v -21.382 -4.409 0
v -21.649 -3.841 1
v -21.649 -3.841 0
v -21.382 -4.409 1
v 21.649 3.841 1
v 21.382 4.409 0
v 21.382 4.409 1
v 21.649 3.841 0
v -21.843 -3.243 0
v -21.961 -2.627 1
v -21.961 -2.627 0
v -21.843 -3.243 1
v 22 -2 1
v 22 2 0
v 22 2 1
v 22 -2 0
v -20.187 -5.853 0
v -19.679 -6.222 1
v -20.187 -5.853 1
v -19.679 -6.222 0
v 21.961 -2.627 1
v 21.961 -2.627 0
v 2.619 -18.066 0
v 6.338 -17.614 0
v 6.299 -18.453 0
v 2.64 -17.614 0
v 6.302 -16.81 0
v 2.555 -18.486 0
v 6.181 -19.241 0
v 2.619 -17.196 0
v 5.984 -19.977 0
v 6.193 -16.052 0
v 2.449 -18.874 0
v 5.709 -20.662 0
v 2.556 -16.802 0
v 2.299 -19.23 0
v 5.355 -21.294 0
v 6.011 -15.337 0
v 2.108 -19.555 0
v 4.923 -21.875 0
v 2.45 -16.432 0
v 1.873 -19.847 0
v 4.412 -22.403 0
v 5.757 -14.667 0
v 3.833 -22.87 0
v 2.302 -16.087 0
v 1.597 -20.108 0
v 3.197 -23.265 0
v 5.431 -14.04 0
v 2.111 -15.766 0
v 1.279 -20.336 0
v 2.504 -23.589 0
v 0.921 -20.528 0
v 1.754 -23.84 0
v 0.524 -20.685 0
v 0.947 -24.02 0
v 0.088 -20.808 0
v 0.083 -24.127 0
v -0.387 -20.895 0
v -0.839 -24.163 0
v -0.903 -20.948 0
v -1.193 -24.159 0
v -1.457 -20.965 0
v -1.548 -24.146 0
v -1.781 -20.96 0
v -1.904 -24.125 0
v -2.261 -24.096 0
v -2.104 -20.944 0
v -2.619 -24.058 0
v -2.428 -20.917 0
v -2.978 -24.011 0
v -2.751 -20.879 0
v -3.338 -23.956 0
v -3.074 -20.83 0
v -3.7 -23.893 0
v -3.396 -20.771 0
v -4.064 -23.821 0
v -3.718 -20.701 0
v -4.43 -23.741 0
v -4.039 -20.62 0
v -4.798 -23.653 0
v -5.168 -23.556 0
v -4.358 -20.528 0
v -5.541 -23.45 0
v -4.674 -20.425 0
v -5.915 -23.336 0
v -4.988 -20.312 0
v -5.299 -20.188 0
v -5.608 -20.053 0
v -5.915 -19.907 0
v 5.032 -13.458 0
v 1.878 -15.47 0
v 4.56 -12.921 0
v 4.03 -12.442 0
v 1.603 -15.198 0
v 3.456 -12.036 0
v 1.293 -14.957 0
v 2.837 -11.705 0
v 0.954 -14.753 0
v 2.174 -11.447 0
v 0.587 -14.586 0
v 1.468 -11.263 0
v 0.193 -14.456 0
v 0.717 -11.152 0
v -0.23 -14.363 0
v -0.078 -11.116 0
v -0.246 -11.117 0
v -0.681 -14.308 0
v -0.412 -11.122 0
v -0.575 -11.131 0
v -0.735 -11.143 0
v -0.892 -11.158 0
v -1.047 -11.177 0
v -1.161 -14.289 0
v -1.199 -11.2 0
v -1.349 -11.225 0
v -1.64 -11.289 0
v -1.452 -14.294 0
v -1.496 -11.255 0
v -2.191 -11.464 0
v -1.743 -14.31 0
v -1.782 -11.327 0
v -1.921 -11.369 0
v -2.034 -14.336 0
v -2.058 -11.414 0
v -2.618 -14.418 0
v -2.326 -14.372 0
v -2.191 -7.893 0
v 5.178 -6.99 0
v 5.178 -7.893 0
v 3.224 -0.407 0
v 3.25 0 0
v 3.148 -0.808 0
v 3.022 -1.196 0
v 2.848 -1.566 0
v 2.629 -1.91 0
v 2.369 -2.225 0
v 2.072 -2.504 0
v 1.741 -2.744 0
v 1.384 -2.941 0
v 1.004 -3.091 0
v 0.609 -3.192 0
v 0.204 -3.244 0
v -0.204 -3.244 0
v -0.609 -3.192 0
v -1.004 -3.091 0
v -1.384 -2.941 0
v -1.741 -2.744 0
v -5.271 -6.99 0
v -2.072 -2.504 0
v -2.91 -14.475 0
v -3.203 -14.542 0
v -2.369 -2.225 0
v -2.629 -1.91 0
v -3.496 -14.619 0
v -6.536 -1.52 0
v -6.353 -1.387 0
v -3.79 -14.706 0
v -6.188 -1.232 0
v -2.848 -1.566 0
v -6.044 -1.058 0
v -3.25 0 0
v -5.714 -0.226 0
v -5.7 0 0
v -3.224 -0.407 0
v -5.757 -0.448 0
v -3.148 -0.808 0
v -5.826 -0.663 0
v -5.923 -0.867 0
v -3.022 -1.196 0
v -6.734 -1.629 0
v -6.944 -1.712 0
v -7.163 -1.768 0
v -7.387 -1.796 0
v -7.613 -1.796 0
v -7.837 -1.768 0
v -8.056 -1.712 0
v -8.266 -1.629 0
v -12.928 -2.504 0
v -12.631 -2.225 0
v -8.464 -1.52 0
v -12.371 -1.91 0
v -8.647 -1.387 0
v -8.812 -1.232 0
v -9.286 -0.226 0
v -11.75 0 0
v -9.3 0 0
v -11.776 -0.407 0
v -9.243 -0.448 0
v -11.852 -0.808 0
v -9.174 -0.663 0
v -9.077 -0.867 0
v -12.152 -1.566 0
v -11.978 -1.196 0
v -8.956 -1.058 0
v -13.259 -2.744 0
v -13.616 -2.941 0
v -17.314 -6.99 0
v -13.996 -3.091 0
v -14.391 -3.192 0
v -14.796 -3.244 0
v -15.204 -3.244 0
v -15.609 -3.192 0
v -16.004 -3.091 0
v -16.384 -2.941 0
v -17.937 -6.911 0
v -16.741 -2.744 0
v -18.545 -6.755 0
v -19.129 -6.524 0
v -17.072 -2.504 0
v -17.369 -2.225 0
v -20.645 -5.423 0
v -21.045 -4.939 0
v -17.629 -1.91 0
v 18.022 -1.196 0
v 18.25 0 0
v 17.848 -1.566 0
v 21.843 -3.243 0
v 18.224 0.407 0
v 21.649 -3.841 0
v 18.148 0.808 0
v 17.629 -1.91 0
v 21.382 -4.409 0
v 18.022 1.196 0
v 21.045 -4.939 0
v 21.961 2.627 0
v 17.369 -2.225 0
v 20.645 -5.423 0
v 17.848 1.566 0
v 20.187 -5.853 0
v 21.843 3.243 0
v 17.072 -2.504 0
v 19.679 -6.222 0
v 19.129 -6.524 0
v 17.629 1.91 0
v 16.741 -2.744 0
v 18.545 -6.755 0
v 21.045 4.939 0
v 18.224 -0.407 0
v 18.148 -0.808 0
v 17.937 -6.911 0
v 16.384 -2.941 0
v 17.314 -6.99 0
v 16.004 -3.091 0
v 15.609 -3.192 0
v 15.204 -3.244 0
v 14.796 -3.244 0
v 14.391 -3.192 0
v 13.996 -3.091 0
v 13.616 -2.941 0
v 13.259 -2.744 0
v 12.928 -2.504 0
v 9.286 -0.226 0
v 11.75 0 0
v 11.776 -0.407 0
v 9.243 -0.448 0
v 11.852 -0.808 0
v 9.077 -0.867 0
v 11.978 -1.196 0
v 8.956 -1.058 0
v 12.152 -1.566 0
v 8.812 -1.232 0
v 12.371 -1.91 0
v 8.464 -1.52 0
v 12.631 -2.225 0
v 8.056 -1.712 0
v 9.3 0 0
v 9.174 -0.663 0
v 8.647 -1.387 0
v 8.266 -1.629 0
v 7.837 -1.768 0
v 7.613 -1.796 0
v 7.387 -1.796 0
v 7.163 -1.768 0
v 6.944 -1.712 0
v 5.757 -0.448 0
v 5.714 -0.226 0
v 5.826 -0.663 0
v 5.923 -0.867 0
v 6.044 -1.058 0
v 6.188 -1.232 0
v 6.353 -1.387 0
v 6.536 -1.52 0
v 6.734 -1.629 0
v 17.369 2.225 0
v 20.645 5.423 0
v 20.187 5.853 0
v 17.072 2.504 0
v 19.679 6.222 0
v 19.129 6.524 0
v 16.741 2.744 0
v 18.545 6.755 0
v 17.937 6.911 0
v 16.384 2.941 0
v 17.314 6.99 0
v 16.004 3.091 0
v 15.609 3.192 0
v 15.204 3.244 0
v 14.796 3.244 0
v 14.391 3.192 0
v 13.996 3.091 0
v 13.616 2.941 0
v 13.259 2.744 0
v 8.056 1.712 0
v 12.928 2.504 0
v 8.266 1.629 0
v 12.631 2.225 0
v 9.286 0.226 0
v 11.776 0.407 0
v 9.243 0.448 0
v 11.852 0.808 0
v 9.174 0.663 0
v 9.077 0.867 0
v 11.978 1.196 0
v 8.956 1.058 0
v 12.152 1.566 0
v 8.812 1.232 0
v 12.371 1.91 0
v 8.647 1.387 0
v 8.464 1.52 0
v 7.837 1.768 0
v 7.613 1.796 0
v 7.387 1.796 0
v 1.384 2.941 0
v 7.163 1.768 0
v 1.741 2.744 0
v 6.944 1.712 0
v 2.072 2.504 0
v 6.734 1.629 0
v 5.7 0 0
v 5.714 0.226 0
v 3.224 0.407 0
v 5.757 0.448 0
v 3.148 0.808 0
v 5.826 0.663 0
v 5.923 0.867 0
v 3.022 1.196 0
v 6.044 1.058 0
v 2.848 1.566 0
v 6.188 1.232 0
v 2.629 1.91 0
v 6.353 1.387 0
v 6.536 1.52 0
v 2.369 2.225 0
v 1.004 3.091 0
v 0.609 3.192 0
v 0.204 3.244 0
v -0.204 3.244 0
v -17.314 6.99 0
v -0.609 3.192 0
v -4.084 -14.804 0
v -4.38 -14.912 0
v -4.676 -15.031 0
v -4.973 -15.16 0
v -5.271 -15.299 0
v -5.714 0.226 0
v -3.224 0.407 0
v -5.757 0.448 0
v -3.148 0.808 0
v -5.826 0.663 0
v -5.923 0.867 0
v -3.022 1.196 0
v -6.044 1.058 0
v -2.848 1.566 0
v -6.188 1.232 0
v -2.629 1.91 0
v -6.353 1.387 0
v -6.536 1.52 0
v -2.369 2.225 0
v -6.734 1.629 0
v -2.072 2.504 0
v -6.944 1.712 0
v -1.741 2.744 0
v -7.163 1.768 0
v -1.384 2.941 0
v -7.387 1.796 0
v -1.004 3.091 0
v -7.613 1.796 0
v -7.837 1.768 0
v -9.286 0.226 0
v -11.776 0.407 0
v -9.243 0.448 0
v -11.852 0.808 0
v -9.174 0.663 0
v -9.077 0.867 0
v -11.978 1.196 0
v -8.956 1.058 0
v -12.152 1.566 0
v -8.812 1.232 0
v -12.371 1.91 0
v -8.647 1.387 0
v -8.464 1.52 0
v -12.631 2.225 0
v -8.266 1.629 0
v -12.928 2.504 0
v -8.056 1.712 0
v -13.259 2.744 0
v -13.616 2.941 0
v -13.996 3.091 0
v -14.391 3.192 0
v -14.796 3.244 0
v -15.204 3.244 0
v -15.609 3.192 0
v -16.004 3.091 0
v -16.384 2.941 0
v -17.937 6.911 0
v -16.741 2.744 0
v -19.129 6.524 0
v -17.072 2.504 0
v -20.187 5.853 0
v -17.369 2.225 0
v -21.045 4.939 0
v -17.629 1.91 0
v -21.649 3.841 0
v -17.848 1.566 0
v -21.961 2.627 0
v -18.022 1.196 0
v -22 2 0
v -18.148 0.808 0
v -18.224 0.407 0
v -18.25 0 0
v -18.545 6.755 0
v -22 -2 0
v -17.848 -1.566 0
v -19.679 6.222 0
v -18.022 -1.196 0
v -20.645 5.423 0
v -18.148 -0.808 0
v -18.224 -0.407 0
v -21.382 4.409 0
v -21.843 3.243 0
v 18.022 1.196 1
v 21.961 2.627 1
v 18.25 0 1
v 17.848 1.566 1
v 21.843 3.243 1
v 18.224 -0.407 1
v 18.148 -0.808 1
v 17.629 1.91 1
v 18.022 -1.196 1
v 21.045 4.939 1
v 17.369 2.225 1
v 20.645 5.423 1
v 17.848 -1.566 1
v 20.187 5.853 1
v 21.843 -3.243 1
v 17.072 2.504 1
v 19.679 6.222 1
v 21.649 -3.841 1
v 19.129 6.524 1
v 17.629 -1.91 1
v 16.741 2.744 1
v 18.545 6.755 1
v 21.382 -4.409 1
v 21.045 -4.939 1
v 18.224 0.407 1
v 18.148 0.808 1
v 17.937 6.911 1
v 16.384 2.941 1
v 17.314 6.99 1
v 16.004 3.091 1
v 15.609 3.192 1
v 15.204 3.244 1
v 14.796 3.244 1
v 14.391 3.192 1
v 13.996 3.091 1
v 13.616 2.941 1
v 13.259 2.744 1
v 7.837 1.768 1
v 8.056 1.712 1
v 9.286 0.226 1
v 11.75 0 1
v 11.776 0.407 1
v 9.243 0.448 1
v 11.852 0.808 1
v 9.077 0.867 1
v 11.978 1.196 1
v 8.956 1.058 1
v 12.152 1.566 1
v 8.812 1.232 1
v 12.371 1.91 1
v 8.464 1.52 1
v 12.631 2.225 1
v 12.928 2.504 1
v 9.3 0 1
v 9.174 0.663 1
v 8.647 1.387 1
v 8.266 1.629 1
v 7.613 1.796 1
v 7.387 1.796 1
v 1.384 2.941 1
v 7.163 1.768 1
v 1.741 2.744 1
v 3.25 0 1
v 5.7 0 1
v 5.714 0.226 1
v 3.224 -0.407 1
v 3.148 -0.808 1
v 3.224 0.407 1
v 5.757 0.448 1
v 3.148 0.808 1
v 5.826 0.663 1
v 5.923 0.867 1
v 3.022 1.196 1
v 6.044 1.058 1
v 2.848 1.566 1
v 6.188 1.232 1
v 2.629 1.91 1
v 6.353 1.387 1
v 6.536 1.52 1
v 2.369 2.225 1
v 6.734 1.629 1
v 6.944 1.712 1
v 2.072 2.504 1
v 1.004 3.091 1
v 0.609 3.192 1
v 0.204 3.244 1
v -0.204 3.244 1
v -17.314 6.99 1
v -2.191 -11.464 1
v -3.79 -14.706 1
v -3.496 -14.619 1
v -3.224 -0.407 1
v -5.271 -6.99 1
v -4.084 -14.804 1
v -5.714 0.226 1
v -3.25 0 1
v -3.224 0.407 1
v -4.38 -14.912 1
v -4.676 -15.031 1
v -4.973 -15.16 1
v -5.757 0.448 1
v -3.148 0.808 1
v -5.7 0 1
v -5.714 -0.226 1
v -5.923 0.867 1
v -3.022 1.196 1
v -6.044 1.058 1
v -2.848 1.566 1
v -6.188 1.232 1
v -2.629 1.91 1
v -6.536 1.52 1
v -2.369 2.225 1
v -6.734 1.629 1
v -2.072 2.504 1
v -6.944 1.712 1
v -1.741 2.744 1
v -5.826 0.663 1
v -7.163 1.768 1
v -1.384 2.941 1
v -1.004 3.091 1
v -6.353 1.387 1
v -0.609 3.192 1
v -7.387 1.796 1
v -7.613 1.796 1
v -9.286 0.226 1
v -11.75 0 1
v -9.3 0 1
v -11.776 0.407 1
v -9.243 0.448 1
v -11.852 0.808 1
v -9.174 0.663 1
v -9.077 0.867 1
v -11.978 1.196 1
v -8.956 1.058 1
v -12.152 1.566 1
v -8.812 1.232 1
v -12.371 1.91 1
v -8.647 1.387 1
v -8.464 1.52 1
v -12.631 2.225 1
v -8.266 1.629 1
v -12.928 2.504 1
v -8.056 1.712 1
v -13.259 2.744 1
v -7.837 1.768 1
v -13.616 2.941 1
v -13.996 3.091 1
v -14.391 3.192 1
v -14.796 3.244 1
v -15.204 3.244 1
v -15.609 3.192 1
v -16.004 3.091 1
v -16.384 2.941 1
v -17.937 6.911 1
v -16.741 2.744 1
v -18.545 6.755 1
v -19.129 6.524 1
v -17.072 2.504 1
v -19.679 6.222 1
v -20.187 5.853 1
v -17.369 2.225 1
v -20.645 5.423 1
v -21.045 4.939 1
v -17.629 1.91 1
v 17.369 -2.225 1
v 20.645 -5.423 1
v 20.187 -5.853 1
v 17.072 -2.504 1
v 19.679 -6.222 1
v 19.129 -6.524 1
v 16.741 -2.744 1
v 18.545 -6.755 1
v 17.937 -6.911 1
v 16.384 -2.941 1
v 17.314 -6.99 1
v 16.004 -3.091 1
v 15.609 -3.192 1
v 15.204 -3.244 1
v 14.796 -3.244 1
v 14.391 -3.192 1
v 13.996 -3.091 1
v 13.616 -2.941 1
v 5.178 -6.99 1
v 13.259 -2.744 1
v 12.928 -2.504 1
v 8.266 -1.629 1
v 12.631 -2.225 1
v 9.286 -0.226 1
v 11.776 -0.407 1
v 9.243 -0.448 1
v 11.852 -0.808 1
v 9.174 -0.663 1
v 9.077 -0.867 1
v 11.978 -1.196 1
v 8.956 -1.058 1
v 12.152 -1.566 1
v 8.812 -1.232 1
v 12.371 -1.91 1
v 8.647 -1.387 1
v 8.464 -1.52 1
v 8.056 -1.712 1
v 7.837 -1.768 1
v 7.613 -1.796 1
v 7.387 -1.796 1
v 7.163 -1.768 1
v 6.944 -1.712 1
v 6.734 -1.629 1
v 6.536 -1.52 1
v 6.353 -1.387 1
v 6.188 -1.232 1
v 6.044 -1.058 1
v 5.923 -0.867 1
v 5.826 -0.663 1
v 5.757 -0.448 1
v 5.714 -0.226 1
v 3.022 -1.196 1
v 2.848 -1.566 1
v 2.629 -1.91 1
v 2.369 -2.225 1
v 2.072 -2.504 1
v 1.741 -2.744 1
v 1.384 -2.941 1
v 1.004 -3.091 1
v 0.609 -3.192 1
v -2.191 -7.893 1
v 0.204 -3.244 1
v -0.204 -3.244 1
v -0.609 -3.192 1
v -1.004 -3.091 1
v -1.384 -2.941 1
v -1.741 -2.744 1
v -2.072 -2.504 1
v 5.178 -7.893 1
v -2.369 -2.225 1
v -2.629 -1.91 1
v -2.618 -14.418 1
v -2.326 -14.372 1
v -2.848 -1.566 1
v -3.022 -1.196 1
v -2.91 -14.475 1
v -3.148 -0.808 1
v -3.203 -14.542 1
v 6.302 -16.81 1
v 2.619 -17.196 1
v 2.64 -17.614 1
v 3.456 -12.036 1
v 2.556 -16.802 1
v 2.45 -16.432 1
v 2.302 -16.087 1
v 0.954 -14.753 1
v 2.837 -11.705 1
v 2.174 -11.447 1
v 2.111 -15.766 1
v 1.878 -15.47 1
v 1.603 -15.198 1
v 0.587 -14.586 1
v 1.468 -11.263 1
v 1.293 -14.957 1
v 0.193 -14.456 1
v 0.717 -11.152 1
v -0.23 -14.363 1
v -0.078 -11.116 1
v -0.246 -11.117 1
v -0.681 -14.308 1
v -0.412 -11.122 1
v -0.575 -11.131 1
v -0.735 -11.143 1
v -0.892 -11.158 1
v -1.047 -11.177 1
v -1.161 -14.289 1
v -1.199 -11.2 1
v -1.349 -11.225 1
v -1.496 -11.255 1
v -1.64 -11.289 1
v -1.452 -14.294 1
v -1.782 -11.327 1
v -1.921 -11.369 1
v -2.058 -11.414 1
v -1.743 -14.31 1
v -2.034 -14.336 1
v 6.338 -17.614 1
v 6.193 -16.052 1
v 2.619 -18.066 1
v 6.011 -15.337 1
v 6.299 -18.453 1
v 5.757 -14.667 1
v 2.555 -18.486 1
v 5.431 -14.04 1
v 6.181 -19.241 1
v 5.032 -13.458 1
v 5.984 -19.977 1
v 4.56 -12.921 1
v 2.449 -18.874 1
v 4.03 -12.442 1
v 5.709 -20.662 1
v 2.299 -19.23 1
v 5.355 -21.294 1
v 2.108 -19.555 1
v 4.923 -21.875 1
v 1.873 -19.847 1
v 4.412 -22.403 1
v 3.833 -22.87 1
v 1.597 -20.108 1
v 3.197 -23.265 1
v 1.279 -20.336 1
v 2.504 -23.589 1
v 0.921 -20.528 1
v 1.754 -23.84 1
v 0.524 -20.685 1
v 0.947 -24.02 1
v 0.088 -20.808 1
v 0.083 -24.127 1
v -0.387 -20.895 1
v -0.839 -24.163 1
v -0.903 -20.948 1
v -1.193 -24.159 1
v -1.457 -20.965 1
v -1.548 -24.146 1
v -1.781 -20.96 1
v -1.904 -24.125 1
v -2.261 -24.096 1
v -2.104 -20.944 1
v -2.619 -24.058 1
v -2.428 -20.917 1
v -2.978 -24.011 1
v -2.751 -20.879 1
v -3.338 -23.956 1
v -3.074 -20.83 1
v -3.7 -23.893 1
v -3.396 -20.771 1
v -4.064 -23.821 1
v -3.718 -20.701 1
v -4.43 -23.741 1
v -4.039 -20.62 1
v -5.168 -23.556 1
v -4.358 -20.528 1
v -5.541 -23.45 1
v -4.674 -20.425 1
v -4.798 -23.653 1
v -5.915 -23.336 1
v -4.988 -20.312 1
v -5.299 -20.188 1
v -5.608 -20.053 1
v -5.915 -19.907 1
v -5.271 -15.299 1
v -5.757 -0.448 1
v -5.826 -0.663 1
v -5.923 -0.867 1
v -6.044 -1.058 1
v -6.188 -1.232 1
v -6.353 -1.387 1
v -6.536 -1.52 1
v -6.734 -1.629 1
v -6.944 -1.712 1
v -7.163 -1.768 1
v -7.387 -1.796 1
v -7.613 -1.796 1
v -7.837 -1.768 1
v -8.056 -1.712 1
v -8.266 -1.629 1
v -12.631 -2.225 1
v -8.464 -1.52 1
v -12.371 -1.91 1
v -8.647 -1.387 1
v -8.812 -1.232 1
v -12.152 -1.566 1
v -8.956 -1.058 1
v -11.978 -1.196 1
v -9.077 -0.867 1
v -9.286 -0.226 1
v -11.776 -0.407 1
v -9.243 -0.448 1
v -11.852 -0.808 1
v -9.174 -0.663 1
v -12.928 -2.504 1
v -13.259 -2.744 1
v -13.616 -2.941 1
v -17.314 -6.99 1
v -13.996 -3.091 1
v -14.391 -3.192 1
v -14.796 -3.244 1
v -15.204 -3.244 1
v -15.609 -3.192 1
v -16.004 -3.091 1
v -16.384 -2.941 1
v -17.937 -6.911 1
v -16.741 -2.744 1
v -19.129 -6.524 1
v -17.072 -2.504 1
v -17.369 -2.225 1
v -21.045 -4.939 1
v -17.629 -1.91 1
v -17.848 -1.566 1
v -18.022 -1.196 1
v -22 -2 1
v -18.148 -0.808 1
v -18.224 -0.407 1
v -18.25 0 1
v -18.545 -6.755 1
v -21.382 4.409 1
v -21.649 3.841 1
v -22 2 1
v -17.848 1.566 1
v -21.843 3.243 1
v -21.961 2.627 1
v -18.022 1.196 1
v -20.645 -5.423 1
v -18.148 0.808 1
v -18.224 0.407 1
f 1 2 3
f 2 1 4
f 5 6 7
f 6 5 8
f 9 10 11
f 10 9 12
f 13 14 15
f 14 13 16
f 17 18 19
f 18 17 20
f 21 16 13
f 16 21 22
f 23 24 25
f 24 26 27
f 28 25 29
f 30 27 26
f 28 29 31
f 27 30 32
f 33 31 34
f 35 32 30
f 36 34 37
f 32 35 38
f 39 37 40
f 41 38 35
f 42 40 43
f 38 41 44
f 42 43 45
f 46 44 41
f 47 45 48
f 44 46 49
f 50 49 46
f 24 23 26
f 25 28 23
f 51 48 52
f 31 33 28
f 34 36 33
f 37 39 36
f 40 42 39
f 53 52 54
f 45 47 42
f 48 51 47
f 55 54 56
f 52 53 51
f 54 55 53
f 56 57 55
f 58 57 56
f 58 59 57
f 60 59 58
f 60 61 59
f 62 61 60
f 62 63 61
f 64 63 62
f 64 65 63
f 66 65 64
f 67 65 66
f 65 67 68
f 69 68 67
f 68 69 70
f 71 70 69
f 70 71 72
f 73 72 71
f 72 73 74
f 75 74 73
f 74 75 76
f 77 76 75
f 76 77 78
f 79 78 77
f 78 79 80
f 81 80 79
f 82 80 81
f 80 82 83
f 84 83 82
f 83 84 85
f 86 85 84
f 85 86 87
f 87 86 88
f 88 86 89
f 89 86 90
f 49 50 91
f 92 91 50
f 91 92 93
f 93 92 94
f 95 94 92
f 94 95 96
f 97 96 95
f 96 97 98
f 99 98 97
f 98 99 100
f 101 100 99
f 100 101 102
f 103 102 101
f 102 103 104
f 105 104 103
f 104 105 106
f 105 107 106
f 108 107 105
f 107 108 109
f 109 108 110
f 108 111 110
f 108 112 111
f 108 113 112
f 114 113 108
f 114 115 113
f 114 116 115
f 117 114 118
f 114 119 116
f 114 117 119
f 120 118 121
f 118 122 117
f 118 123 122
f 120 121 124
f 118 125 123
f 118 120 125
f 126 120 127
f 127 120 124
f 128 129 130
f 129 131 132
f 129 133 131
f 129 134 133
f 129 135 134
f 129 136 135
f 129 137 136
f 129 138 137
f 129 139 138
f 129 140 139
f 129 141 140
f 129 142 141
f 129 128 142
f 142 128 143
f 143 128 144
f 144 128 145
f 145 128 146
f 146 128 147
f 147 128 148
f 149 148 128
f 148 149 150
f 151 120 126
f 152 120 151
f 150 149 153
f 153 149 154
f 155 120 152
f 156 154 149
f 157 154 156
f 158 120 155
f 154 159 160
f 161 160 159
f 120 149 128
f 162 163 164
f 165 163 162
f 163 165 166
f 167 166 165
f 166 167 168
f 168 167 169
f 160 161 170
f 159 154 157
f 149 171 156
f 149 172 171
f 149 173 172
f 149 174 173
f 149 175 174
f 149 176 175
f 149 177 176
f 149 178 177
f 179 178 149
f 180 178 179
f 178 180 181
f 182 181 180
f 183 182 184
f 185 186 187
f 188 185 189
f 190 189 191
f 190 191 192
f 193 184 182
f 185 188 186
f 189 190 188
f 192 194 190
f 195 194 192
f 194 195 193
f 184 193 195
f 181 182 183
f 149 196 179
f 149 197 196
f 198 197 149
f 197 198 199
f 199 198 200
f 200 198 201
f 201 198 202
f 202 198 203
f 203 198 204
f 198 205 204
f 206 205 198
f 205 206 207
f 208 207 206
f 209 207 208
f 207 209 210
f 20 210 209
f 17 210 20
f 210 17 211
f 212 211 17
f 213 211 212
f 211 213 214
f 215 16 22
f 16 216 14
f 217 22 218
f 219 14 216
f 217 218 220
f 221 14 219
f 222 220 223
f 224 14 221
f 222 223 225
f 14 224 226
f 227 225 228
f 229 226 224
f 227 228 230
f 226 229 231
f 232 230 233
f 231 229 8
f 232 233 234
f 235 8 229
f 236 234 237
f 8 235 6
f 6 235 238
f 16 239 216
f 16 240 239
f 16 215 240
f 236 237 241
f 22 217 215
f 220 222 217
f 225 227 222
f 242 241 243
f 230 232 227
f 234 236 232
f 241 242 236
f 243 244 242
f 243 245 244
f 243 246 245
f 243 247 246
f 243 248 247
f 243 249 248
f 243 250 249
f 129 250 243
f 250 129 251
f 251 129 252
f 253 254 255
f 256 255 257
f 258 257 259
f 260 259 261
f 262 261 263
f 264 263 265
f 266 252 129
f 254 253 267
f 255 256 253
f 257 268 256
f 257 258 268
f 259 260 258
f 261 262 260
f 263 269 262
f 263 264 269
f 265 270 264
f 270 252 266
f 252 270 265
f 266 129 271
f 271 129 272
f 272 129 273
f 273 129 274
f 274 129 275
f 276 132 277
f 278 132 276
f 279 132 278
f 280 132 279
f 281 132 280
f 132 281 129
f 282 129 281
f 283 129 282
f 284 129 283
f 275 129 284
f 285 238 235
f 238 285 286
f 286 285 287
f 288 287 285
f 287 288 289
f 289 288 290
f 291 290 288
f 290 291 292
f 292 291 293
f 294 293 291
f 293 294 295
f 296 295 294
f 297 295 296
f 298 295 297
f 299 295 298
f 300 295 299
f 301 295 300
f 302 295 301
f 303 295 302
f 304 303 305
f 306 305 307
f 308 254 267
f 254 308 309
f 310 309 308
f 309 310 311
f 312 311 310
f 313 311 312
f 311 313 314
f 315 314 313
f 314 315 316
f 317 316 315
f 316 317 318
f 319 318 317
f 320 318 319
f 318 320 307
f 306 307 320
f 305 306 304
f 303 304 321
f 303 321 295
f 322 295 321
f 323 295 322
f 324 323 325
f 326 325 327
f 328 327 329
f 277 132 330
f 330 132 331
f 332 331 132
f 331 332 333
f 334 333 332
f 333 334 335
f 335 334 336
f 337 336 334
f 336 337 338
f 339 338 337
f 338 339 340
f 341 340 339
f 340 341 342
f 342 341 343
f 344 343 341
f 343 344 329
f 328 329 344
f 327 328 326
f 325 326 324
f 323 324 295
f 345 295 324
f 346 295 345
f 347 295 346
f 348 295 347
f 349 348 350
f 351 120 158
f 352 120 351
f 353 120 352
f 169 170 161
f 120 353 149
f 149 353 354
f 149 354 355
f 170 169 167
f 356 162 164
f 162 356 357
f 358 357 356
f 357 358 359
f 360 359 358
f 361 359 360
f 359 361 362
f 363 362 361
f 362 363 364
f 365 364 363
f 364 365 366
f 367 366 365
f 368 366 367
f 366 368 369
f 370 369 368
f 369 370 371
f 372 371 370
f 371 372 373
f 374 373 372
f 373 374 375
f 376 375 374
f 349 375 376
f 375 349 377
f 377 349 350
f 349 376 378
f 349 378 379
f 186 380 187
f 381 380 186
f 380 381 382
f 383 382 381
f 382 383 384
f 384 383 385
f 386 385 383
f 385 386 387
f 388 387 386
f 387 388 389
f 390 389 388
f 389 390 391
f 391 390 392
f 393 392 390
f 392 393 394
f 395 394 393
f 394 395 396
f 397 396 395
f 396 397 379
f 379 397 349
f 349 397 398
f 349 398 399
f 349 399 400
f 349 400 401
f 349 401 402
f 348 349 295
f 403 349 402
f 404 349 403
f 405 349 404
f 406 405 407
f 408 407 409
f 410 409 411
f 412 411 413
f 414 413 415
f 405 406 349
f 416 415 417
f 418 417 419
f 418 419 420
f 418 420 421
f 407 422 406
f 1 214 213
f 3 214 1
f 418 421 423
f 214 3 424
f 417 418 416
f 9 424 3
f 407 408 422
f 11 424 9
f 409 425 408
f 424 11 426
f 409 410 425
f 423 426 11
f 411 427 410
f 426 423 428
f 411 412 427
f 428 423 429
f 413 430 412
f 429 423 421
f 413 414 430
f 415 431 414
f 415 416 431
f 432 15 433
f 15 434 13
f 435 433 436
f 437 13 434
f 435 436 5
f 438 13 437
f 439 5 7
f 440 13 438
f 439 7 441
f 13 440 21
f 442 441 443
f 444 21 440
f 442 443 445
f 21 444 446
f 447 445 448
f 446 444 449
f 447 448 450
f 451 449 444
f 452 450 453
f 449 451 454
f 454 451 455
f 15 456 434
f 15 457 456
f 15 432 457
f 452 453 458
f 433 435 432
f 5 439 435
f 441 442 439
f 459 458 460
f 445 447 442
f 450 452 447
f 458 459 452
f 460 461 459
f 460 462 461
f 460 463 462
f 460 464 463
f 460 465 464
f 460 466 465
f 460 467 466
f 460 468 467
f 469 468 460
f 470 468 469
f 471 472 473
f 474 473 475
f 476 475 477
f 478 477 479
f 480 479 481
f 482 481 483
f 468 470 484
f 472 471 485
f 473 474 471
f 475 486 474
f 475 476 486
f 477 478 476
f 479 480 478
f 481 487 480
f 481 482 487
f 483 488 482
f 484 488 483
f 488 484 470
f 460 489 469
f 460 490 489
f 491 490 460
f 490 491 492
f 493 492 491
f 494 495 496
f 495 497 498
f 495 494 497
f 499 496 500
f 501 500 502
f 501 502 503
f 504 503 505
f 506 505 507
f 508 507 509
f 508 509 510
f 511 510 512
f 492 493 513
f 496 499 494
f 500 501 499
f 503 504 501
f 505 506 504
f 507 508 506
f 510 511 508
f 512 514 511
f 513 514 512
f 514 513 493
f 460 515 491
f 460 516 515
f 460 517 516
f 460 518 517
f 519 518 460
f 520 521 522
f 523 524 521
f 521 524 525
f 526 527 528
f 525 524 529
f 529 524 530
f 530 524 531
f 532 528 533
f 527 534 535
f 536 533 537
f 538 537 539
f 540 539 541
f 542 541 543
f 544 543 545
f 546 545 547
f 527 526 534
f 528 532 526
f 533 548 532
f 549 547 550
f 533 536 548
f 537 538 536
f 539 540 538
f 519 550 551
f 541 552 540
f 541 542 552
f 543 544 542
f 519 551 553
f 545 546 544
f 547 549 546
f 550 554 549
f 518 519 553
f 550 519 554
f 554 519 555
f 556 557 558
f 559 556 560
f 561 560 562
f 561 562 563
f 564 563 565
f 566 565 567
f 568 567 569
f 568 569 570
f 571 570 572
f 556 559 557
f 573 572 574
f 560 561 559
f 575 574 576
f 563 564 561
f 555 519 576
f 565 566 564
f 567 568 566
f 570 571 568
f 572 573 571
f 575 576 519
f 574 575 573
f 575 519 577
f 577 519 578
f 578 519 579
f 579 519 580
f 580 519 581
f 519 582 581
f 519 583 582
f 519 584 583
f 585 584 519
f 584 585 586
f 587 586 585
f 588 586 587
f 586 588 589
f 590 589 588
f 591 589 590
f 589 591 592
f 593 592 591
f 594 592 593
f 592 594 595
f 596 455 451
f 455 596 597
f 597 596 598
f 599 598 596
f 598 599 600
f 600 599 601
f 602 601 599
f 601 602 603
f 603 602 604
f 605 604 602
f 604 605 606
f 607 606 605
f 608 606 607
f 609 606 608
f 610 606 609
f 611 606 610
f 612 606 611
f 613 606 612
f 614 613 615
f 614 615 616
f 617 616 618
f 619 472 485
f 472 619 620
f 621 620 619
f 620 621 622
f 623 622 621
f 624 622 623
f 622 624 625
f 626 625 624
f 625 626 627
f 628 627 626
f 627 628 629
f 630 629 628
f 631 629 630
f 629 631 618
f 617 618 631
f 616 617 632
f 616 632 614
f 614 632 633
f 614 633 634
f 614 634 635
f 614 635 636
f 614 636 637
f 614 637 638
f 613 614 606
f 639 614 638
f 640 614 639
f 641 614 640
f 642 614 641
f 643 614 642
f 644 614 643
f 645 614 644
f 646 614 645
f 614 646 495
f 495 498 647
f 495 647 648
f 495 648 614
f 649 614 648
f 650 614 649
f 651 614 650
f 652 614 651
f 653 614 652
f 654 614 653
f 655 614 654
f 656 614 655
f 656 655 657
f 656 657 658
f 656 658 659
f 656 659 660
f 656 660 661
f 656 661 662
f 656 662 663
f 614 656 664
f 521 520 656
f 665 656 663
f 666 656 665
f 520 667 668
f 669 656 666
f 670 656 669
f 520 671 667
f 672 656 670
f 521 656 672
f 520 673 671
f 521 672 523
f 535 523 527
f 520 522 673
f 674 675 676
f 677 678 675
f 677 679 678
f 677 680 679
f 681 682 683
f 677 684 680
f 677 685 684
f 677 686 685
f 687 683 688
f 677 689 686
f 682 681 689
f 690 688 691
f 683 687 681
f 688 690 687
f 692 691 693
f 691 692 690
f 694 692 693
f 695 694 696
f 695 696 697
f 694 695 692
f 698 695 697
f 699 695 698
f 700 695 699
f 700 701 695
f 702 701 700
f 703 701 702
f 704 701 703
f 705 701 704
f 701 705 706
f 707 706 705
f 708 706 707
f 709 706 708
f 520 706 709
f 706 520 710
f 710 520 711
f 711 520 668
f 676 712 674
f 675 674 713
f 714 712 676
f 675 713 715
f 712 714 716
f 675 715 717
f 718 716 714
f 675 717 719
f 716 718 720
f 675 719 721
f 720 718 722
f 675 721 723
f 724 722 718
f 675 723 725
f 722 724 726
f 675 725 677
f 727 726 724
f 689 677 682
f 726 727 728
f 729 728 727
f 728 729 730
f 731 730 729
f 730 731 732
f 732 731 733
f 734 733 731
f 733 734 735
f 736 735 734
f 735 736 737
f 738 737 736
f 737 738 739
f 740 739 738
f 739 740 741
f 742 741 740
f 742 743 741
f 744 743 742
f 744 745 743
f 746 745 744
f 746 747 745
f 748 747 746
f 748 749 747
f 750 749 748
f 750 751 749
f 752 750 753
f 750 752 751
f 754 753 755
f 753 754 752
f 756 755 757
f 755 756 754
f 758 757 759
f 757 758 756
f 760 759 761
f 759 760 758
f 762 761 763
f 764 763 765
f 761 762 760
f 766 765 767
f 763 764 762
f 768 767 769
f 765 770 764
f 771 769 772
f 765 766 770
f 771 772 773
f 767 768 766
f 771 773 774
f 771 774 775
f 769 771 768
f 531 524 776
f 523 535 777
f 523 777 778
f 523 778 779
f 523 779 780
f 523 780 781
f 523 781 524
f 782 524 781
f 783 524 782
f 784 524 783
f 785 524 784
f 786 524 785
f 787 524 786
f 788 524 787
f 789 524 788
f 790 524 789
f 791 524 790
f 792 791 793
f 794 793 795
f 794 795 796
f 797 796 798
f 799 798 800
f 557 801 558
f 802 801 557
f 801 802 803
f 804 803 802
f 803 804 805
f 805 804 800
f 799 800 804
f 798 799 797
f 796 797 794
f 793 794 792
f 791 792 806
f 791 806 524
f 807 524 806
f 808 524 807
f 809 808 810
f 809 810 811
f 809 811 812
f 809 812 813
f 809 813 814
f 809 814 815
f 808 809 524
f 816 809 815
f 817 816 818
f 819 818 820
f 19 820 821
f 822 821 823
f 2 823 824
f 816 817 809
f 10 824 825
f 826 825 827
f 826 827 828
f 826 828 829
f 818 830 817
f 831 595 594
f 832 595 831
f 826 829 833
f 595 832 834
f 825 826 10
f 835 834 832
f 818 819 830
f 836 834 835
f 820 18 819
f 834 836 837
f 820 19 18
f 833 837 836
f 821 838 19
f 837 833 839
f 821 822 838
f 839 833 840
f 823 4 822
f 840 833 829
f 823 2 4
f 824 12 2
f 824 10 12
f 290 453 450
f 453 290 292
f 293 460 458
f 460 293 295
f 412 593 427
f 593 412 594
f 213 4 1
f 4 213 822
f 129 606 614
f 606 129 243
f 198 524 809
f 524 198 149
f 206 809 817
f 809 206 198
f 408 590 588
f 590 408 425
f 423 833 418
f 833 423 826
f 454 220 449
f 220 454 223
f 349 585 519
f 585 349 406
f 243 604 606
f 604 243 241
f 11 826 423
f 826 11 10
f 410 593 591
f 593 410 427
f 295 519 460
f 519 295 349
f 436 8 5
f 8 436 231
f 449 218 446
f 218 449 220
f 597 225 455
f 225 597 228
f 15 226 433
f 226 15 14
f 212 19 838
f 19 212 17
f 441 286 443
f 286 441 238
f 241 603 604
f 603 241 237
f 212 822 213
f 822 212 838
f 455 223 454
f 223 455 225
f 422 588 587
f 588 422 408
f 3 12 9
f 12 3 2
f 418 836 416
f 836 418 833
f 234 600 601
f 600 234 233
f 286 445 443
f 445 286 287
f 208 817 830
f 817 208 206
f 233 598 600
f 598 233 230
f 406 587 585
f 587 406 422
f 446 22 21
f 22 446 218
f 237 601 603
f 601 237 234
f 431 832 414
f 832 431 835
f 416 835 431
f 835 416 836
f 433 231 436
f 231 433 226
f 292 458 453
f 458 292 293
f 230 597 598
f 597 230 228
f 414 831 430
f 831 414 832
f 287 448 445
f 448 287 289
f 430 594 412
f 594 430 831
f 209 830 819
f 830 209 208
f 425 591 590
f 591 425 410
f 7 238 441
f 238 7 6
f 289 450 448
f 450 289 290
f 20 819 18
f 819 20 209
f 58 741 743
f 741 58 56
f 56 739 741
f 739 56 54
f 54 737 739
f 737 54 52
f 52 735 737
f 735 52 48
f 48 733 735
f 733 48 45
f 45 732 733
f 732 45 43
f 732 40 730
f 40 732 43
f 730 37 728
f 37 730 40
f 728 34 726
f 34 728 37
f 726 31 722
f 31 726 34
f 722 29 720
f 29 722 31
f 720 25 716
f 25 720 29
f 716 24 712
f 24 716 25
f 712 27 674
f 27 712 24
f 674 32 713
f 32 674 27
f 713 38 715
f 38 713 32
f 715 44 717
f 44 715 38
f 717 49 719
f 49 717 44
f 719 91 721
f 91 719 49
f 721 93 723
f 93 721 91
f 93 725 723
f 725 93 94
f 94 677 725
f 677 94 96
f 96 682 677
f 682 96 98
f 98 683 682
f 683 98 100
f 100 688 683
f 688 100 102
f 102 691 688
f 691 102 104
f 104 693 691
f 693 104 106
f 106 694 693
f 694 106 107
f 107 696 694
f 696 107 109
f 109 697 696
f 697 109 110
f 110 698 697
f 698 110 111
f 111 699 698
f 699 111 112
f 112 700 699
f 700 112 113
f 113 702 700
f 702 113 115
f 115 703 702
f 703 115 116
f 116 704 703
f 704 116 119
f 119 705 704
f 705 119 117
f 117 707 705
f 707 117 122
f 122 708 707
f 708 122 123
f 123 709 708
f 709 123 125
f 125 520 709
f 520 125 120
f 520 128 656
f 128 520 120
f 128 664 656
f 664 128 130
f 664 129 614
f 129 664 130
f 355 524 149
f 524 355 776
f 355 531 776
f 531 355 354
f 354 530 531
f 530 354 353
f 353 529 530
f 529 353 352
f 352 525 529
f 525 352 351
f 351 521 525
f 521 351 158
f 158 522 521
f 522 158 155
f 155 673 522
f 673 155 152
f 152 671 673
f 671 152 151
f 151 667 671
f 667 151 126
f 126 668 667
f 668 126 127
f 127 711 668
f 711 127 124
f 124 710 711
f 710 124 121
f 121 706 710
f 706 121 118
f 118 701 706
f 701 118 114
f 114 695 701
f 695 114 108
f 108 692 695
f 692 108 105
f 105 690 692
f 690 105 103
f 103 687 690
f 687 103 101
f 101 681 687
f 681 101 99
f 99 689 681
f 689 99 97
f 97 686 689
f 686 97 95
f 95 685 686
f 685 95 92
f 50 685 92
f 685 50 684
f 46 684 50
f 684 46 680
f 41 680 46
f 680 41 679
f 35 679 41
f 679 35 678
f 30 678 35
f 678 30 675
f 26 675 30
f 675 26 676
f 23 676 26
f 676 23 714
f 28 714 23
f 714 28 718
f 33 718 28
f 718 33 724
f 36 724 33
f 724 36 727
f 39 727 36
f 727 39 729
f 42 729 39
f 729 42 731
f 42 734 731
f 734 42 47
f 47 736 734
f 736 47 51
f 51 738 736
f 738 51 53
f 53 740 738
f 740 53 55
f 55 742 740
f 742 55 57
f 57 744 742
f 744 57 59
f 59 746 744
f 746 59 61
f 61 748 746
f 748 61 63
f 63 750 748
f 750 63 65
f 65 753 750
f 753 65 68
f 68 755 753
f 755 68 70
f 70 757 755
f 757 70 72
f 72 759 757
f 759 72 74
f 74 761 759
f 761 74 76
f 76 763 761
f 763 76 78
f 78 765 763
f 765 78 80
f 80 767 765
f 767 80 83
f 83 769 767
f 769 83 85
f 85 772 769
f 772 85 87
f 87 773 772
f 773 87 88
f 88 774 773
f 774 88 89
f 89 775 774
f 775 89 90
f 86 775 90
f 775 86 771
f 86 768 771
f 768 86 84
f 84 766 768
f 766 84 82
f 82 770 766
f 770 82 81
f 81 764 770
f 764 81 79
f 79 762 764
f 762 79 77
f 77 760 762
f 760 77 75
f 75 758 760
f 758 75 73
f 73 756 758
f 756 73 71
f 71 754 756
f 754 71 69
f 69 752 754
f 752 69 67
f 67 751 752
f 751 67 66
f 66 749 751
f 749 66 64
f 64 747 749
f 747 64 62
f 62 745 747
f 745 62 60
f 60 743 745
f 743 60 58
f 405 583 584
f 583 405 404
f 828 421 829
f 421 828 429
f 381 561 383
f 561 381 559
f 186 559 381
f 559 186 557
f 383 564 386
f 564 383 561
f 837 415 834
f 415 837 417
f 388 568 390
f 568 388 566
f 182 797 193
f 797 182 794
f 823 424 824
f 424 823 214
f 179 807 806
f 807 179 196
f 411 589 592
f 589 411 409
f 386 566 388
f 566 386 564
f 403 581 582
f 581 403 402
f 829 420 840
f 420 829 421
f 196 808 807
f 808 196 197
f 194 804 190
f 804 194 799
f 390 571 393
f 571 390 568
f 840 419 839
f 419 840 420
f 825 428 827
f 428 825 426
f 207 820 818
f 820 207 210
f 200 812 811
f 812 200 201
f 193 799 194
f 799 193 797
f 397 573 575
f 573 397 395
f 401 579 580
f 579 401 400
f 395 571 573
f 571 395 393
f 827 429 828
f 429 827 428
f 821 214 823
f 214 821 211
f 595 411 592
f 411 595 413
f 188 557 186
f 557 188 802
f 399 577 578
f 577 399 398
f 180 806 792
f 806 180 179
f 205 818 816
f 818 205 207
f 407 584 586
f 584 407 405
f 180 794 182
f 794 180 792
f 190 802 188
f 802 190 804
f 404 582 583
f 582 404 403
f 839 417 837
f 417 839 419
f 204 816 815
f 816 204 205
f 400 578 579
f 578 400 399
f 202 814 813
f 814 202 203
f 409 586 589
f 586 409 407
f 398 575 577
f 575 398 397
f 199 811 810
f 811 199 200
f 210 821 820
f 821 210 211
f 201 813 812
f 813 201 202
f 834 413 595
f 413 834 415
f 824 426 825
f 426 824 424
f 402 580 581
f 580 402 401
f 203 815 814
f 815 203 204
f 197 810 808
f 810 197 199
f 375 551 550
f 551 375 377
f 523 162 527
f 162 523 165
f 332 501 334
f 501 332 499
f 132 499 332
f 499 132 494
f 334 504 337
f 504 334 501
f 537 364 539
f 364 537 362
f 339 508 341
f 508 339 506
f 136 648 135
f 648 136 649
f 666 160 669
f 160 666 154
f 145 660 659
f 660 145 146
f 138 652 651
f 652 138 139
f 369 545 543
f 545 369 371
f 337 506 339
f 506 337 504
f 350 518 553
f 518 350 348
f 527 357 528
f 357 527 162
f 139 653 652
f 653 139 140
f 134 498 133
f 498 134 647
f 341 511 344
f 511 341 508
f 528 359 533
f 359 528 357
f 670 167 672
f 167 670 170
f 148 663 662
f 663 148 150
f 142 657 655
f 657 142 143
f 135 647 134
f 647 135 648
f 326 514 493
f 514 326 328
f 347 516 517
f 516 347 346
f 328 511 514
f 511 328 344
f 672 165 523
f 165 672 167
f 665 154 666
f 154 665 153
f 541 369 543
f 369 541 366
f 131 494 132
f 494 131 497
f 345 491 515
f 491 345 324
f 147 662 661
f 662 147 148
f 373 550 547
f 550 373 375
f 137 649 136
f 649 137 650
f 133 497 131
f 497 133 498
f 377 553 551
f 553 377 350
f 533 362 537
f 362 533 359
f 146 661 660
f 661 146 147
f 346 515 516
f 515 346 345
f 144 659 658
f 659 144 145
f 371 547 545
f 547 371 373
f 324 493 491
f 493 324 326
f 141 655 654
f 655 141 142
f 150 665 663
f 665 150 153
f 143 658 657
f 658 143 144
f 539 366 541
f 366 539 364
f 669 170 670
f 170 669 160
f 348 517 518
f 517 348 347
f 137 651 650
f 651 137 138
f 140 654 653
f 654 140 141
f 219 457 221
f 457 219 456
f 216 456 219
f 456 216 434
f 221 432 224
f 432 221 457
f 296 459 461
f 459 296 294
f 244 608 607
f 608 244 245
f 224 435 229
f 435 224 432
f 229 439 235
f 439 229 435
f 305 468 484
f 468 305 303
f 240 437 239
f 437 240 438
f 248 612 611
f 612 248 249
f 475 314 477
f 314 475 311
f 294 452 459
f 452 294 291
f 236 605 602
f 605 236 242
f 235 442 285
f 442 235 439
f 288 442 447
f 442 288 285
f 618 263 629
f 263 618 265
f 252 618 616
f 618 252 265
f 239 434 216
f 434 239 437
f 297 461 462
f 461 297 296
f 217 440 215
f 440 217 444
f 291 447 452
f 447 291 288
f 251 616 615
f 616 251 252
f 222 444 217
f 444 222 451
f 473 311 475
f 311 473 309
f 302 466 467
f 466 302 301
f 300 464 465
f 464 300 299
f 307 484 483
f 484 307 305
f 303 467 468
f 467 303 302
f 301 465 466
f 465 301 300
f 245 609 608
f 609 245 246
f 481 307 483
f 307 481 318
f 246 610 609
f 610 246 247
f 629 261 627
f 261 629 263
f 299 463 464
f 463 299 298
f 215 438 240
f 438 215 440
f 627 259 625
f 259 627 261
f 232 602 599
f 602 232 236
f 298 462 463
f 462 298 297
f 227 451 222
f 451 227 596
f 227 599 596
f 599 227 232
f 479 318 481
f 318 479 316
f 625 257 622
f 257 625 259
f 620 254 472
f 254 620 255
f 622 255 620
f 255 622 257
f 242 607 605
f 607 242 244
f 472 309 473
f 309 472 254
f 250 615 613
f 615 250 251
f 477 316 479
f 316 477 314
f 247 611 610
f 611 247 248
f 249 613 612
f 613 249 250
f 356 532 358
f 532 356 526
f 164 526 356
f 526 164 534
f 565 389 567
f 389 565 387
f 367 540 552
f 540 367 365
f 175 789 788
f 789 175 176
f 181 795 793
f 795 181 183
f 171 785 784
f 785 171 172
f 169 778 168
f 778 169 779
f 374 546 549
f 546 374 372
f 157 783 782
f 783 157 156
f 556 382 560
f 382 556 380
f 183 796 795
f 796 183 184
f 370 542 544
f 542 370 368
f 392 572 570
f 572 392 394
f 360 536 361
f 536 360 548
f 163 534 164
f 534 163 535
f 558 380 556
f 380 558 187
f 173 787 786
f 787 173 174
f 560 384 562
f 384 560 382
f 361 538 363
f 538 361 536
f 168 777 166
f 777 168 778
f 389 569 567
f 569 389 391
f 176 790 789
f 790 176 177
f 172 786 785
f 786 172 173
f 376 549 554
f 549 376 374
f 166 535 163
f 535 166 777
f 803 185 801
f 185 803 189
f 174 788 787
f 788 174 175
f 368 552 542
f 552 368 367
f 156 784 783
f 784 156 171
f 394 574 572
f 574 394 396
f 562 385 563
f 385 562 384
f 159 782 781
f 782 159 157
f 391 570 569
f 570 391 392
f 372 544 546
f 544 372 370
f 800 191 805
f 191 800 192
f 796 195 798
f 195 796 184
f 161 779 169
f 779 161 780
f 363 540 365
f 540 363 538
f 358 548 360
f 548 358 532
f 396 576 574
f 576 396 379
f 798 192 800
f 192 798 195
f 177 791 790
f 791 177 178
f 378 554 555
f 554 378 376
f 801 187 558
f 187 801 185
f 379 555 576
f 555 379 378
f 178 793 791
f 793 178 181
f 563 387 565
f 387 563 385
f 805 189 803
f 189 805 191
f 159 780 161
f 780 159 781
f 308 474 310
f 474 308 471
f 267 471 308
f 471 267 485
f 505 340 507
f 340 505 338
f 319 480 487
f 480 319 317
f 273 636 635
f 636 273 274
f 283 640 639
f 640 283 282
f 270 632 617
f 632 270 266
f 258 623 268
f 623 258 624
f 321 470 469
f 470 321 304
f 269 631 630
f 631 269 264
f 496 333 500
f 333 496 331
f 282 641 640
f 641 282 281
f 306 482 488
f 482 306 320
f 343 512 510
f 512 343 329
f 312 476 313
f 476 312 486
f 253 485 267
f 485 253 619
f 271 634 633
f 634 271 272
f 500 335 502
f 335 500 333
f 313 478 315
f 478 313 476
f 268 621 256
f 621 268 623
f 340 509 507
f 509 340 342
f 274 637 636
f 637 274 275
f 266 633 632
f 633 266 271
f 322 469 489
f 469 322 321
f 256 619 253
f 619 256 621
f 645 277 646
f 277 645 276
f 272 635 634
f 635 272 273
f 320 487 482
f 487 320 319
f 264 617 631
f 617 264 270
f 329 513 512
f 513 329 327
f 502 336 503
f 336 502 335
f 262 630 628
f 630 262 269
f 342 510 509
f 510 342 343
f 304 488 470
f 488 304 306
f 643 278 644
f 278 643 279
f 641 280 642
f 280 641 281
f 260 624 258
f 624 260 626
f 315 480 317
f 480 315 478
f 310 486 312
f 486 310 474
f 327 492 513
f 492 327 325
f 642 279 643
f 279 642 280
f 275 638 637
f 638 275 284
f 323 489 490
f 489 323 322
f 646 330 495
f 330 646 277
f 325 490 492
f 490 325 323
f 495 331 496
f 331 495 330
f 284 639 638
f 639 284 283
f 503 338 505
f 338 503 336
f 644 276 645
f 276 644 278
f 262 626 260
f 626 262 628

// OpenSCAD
$fn = 50;


difference() {
	union() {
		hull() {
			translate(v = [-17.0000000000, 2.0000000000, 0]) {
				cylinder(h = 1, r = 5);
			}
			translate(v = [17.0000000000, 2.0000000000, 0]) {
				cylinder(h = 1, r = 5);
			}
			translate(v = [-17.0000000000, -2.0000000000, 0]) {
				cylinder(h = 1, r = 5);
			}
			translate(v = [17.0000000000, -2.0000000000, 0]) {
				cylinder(h = 1, r = 5);
			}
		}
		translate(v = [0, -5, 0]) {
			linear_extrude(height = 1) {
				text(font = "DejaVu Sans Mono:style=Bold", halign = "center", size = 19.0000000000, text = "5", valign = "top");
			}
		}
	}
	union() {
		translate(v = [-15.0000000000, 0.0000000000, 0]) {
			translate(v = [0, 0, -100]) {
				cylinder(h = 200, r = 3.2500000000);
			}
		}
		translate(v = [0, 0, -100]) {
			cylinder(h = 200, r = 3.2500000000);
		}
		translate(v = [15.0000000000, 0.0000000000, 0]) {
			translate(v = [0, 0, -100]) {
				cylinder(h = 200, r = 3.2500000000);
			}
		}
		translate(v = [-15.0000000000, 0.0000000000, 0]) {
			translate(v = [0, 0, -100]) {
				cylinder(h = 200, r = 1.8000000000);
			}
		}
		translate(v = [-7.5000000000, 0.0000000000, 0]) {
			translate(v = [0, 0, -100]) {
				cylinder(h = 200, r = 1.8000000000);
			}
		}
		translate(v = [0, 0, -100]) {
			cylinder(h = 200, r = 1.8000000000);
		}
		translate(v = [7.5000000000, 0.0000000000, 0]) {
			translate(v = [0, 0, -100]) {
				cylinder(h = 200, r = 1.8000000000);
			}
		}
		translate(v = [15.0000000000, 0.0000000000, 0]) {
			translate(v = [0, 0, -100]) {
				cylinder(h = 200, r = 1.8000000000);
			}
		}
	}
}
